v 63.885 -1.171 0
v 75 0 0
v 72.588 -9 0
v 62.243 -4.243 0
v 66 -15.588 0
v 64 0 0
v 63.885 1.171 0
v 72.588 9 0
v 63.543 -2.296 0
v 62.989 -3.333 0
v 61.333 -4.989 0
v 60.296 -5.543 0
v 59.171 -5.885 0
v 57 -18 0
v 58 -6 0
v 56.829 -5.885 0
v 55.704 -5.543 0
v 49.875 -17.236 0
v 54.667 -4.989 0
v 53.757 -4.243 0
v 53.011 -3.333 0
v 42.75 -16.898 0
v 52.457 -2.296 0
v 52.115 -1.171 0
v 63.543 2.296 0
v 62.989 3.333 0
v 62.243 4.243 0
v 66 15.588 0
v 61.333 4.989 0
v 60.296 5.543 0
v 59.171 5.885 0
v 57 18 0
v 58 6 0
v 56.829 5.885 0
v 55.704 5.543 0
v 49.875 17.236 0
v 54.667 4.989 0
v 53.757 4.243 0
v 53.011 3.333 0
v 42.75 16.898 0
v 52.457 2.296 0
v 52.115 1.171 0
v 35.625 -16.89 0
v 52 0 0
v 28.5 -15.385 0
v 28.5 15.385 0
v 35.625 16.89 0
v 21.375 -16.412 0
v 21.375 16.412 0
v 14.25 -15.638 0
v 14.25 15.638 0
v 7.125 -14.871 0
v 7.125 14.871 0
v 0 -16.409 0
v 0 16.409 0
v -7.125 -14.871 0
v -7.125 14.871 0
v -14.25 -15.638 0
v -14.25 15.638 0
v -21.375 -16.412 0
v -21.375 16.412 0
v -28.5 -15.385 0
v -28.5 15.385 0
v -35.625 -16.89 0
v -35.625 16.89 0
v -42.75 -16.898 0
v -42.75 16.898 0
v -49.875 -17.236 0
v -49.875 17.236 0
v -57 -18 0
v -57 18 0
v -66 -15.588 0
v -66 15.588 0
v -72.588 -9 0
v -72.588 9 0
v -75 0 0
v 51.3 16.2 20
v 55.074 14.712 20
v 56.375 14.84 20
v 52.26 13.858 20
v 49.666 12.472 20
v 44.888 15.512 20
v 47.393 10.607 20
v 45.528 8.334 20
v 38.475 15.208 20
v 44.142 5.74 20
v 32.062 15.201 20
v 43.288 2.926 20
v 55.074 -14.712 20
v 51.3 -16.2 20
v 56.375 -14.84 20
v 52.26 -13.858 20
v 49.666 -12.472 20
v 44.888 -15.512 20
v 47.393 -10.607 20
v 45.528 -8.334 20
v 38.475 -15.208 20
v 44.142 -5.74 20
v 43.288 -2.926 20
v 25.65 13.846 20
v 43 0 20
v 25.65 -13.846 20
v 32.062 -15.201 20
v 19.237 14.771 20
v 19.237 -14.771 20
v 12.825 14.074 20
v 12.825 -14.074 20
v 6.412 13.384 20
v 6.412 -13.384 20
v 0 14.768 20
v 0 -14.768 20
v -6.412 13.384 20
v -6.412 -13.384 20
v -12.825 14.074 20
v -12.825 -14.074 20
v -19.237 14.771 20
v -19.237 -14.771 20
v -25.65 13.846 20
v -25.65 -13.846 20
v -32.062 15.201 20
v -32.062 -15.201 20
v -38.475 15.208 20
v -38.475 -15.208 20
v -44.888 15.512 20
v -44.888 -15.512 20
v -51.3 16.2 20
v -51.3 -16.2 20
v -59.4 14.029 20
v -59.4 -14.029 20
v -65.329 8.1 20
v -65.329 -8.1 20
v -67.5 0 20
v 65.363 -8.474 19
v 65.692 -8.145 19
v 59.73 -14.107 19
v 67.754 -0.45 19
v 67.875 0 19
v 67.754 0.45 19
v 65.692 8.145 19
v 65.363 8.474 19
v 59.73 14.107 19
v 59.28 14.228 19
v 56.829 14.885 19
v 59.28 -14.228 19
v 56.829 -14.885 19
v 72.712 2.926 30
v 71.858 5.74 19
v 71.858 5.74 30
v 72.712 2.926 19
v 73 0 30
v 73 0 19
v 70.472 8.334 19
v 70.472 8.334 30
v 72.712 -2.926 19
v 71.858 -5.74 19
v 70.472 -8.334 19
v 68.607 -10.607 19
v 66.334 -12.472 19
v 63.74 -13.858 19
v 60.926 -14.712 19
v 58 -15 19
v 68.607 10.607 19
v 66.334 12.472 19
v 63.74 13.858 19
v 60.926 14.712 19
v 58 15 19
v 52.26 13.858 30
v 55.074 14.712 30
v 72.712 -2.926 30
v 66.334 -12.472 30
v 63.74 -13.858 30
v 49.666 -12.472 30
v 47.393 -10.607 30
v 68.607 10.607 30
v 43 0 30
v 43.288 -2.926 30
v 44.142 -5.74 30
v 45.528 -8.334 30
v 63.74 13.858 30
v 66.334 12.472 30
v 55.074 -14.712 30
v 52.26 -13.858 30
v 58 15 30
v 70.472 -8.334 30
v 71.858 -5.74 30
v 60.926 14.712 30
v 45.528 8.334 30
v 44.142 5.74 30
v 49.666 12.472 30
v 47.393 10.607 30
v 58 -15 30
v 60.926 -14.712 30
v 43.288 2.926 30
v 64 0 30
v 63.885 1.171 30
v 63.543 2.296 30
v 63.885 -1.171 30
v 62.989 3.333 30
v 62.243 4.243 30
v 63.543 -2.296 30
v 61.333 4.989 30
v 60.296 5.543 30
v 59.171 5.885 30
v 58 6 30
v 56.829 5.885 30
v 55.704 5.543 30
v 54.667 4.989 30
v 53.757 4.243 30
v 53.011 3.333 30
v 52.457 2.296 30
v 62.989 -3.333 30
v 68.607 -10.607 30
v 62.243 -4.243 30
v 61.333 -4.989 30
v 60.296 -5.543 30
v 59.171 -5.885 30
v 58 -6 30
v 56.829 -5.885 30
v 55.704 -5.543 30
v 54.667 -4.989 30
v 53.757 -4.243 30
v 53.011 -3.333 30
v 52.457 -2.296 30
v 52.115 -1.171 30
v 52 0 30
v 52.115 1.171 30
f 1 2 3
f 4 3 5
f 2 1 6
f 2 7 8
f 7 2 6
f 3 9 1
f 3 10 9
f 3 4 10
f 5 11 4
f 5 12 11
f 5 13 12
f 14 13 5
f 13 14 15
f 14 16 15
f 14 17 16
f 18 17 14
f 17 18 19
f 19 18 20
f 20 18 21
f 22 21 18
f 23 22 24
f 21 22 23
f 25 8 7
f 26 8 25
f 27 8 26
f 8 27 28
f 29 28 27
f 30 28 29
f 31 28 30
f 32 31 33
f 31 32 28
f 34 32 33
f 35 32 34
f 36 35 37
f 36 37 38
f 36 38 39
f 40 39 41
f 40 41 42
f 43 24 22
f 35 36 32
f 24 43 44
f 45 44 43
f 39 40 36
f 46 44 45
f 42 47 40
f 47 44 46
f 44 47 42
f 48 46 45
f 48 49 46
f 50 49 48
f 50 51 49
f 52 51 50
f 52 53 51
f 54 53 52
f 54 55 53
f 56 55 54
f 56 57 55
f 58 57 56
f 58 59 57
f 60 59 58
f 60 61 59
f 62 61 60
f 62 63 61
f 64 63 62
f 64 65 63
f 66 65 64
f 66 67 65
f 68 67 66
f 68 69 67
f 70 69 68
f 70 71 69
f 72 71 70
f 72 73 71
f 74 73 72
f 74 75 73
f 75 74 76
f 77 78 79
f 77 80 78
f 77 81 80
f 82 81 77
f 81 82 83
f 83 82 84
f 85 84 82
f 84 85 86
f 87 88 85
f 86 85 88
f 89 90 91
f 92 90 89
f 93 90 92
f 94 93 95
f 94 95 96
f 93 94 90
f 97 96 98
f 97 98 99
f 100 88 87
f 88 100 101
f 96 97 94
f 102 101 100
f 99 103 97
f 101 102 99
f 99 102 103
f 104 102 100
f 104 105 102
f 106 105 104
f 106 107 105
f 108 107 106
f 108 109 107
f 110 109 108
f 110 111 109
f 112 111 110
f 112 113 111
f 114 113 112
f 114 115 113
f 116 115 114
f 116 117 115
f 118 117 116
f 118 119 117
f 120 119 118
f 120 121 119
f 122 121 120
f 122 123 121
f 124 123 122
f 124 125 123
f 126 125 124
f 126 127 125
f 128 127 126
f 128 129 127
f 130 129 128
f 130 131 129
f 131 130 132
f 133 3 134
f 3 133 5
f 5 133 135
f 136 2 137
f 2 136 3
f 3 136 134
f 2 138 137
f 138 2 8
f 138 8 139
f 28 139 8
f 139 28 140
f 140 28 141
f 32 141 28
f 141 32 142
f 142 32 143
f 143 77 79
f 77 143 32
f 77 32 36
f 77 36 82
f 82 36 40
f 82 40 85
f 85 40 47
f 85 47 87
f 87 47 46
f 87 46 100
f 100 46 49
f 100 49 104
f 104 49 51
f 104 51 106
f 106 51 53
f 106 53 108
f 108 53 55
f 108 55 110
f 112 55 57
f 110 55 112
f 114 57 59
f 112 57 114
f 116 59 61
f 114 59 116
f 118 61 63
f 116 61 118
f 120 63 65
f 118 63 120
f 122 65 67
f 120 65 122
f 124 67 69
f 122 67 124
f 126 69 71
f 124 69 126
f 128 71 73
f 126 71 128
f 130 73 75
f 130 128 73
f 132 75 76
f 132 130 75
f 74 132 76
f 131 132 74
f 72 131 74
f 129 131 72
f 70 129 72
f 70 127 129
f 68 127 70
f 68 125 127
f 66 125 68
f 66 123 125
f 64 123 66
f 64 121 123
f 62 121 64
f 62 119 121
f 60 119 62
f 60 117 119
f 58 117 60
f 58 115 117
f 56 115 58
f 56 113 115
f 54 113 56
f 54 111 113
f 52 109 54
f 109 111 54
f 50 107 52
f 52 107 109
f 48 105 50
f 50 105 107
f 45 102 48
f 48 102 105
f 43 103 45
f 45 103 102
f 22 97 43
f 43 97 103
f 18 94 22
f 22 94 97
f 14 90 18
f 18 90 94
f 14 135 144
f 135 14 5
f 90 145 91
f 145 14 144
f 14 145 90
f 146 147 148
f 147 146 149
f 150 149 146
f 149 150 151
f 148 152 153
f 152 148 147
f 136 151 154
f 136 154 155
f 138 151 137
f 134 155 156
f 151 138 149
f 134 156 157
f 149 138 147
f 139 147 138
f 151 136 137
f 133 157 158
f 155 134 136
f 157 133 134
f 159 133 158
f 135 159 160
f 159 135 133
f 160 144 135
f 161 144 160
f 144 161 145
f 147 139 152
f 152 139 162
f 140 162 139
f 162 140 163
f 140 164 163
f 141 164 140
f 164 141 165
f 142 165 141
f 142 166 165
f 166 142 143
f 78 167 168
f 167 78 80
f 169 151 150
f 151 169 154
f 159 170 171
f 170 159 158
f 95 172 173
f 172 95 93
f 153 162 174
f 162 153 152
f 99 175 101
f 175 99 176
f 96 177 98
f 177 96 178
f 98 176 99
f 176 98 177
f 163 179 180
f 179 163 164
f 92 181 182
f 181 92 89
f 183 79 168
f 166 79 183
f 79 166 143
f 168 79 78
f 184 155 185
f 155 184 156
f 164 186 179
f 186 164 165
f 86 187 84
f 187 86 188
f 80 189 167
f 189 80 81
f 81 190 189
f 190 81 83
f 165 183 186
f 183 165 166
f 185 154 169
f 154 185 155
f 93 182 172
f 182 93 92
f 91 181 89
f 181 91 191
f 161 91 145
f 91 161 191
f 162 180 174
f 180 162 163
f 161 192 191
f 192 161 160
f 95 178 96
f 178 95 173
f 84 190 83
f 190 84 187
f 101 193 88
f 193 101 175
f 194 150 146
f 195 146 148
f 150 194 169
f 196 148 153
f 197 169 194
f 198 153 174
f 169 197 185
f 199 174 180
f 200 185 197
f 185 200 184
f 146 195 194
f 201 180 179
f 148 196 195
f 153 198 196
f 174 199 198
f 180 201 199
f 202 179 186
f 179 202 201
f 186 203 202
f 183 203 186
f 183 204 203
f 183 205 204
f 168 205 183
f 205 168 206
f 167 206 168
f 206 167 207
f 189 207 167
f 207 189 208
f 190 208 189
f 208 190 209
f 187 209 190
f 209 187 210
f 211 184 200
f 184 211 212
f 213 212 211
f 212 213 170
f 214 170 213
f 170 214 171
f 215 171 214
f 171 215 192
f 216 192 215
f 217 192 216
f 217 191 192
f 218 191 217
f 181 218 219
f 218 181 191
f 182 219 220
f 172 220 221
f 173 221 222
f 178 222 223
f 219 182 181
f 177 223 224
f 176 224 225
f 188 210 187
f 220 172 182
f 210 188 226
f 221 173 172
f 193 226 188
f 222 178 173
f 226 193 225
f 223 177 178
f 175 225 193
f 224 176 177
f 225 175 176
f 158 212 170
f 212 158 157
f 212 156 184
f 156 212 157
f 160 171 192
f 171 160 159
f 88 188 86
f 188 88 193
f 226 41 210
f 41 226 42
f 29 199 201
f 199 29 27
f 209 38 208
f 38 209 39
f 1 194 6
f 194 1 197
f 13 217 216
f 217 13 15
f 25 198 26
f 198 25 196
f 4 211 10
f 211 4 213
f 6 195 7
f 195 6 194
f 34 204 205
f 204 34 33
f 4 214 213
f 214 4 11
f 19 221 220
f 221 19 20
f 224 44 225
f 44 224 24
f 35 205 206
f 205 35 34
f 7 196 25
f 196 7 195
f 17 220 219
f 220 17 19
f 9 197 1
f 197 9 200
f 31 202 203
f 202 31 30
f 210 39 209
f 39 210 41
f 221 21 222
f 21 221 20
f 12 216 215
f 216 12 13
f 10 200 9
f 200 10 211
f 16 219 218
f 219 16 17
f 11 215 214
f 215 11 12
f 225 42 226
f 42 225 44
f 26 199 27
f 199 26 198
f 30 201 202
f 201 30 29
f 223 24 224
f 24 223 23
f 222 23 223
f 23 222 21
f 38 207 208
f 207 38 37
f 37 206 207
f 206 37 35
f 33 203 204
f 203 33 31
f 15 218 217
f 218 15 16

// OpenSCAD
$fn = 32;

// ----------------------------------------------------------------------
// Handle: 150 x 36 mm grip, 20 mm thick
// ----------------------------------------------------------------------

// --- parameters (mm) ---
length = 150;             // grip length
width = 36;               // grip width
thickness = 20;           // grip thickness
waist = 0.86;             // width factor at the middle
draft = 0.9;              // top face scale of the extrusion
scallops = 6;             // finger rests per side
ripple = 0.06;            // depth factor of the finger rests
boss_d = 30;              // mounting boss diameter
boss_h = 10;              // mounting boss height
boss_hole_d = 12;         // screw clearance through the boss
boss_r = 58;              // boss centre from the grip centre

/* ergonomic grip outline, closed spline-like polygon in the XY plane */
grip = [[-57, 18], [-49.875, 17.236], [-42.75, 16.898], [-35.625, 16.89], [-28.5, 15.385], [-21.375, 16.412], [-14.25, 15.638], [-7.125, 14.871], [0, 16.409], [7.125, 14.871], [14.25, 15.638], [21.375, 16.412], [28.5, 15.385], [35.625, 16.89], [42.75, 16.898], [49.875, 17.236], [57, 18], [66, 15.588], [72.588, 9], [75, 0], [72.588, -9], [66, -15.588], [57, -18], [57, -18], [49.875, -17.236], [42.75, -16.898], [35.625, -16.89], [28.5, -15.385], [21.375, -16.412], [14.25, -15.638], [7.125, -14.871], [0, -16.409], [-7.125, -14.871], [-14.25, -15.638], [-21.375, -16.412], [-28.5, -15.385], [-35.625, -16.89], [-42.75, -16.898], [-49.875, -17.236], [-57, -18], [-66, -15.588], [-72.588, -9], [-75, 0], [-72.588, 9], [-66, 15.588], [-57, 18]];

module grip_body() {
  linear_extrude(height = thickness, scale = draft) polygon(grip);
}

module boss_body() {
  /* sunk 1 mm into the grip so the joint overlaps */
  translate([boss_r, 0, thickness - 1]) cylinder(h = boss_h + 1, d = boss_d);
}

difference() {
  union() {
    grip_body();
    boss_body();
  }
  translate([boss_r, 0, -1]) cylinder(h = thickness + boss_h + 2, d = boss_hole_d);
}
